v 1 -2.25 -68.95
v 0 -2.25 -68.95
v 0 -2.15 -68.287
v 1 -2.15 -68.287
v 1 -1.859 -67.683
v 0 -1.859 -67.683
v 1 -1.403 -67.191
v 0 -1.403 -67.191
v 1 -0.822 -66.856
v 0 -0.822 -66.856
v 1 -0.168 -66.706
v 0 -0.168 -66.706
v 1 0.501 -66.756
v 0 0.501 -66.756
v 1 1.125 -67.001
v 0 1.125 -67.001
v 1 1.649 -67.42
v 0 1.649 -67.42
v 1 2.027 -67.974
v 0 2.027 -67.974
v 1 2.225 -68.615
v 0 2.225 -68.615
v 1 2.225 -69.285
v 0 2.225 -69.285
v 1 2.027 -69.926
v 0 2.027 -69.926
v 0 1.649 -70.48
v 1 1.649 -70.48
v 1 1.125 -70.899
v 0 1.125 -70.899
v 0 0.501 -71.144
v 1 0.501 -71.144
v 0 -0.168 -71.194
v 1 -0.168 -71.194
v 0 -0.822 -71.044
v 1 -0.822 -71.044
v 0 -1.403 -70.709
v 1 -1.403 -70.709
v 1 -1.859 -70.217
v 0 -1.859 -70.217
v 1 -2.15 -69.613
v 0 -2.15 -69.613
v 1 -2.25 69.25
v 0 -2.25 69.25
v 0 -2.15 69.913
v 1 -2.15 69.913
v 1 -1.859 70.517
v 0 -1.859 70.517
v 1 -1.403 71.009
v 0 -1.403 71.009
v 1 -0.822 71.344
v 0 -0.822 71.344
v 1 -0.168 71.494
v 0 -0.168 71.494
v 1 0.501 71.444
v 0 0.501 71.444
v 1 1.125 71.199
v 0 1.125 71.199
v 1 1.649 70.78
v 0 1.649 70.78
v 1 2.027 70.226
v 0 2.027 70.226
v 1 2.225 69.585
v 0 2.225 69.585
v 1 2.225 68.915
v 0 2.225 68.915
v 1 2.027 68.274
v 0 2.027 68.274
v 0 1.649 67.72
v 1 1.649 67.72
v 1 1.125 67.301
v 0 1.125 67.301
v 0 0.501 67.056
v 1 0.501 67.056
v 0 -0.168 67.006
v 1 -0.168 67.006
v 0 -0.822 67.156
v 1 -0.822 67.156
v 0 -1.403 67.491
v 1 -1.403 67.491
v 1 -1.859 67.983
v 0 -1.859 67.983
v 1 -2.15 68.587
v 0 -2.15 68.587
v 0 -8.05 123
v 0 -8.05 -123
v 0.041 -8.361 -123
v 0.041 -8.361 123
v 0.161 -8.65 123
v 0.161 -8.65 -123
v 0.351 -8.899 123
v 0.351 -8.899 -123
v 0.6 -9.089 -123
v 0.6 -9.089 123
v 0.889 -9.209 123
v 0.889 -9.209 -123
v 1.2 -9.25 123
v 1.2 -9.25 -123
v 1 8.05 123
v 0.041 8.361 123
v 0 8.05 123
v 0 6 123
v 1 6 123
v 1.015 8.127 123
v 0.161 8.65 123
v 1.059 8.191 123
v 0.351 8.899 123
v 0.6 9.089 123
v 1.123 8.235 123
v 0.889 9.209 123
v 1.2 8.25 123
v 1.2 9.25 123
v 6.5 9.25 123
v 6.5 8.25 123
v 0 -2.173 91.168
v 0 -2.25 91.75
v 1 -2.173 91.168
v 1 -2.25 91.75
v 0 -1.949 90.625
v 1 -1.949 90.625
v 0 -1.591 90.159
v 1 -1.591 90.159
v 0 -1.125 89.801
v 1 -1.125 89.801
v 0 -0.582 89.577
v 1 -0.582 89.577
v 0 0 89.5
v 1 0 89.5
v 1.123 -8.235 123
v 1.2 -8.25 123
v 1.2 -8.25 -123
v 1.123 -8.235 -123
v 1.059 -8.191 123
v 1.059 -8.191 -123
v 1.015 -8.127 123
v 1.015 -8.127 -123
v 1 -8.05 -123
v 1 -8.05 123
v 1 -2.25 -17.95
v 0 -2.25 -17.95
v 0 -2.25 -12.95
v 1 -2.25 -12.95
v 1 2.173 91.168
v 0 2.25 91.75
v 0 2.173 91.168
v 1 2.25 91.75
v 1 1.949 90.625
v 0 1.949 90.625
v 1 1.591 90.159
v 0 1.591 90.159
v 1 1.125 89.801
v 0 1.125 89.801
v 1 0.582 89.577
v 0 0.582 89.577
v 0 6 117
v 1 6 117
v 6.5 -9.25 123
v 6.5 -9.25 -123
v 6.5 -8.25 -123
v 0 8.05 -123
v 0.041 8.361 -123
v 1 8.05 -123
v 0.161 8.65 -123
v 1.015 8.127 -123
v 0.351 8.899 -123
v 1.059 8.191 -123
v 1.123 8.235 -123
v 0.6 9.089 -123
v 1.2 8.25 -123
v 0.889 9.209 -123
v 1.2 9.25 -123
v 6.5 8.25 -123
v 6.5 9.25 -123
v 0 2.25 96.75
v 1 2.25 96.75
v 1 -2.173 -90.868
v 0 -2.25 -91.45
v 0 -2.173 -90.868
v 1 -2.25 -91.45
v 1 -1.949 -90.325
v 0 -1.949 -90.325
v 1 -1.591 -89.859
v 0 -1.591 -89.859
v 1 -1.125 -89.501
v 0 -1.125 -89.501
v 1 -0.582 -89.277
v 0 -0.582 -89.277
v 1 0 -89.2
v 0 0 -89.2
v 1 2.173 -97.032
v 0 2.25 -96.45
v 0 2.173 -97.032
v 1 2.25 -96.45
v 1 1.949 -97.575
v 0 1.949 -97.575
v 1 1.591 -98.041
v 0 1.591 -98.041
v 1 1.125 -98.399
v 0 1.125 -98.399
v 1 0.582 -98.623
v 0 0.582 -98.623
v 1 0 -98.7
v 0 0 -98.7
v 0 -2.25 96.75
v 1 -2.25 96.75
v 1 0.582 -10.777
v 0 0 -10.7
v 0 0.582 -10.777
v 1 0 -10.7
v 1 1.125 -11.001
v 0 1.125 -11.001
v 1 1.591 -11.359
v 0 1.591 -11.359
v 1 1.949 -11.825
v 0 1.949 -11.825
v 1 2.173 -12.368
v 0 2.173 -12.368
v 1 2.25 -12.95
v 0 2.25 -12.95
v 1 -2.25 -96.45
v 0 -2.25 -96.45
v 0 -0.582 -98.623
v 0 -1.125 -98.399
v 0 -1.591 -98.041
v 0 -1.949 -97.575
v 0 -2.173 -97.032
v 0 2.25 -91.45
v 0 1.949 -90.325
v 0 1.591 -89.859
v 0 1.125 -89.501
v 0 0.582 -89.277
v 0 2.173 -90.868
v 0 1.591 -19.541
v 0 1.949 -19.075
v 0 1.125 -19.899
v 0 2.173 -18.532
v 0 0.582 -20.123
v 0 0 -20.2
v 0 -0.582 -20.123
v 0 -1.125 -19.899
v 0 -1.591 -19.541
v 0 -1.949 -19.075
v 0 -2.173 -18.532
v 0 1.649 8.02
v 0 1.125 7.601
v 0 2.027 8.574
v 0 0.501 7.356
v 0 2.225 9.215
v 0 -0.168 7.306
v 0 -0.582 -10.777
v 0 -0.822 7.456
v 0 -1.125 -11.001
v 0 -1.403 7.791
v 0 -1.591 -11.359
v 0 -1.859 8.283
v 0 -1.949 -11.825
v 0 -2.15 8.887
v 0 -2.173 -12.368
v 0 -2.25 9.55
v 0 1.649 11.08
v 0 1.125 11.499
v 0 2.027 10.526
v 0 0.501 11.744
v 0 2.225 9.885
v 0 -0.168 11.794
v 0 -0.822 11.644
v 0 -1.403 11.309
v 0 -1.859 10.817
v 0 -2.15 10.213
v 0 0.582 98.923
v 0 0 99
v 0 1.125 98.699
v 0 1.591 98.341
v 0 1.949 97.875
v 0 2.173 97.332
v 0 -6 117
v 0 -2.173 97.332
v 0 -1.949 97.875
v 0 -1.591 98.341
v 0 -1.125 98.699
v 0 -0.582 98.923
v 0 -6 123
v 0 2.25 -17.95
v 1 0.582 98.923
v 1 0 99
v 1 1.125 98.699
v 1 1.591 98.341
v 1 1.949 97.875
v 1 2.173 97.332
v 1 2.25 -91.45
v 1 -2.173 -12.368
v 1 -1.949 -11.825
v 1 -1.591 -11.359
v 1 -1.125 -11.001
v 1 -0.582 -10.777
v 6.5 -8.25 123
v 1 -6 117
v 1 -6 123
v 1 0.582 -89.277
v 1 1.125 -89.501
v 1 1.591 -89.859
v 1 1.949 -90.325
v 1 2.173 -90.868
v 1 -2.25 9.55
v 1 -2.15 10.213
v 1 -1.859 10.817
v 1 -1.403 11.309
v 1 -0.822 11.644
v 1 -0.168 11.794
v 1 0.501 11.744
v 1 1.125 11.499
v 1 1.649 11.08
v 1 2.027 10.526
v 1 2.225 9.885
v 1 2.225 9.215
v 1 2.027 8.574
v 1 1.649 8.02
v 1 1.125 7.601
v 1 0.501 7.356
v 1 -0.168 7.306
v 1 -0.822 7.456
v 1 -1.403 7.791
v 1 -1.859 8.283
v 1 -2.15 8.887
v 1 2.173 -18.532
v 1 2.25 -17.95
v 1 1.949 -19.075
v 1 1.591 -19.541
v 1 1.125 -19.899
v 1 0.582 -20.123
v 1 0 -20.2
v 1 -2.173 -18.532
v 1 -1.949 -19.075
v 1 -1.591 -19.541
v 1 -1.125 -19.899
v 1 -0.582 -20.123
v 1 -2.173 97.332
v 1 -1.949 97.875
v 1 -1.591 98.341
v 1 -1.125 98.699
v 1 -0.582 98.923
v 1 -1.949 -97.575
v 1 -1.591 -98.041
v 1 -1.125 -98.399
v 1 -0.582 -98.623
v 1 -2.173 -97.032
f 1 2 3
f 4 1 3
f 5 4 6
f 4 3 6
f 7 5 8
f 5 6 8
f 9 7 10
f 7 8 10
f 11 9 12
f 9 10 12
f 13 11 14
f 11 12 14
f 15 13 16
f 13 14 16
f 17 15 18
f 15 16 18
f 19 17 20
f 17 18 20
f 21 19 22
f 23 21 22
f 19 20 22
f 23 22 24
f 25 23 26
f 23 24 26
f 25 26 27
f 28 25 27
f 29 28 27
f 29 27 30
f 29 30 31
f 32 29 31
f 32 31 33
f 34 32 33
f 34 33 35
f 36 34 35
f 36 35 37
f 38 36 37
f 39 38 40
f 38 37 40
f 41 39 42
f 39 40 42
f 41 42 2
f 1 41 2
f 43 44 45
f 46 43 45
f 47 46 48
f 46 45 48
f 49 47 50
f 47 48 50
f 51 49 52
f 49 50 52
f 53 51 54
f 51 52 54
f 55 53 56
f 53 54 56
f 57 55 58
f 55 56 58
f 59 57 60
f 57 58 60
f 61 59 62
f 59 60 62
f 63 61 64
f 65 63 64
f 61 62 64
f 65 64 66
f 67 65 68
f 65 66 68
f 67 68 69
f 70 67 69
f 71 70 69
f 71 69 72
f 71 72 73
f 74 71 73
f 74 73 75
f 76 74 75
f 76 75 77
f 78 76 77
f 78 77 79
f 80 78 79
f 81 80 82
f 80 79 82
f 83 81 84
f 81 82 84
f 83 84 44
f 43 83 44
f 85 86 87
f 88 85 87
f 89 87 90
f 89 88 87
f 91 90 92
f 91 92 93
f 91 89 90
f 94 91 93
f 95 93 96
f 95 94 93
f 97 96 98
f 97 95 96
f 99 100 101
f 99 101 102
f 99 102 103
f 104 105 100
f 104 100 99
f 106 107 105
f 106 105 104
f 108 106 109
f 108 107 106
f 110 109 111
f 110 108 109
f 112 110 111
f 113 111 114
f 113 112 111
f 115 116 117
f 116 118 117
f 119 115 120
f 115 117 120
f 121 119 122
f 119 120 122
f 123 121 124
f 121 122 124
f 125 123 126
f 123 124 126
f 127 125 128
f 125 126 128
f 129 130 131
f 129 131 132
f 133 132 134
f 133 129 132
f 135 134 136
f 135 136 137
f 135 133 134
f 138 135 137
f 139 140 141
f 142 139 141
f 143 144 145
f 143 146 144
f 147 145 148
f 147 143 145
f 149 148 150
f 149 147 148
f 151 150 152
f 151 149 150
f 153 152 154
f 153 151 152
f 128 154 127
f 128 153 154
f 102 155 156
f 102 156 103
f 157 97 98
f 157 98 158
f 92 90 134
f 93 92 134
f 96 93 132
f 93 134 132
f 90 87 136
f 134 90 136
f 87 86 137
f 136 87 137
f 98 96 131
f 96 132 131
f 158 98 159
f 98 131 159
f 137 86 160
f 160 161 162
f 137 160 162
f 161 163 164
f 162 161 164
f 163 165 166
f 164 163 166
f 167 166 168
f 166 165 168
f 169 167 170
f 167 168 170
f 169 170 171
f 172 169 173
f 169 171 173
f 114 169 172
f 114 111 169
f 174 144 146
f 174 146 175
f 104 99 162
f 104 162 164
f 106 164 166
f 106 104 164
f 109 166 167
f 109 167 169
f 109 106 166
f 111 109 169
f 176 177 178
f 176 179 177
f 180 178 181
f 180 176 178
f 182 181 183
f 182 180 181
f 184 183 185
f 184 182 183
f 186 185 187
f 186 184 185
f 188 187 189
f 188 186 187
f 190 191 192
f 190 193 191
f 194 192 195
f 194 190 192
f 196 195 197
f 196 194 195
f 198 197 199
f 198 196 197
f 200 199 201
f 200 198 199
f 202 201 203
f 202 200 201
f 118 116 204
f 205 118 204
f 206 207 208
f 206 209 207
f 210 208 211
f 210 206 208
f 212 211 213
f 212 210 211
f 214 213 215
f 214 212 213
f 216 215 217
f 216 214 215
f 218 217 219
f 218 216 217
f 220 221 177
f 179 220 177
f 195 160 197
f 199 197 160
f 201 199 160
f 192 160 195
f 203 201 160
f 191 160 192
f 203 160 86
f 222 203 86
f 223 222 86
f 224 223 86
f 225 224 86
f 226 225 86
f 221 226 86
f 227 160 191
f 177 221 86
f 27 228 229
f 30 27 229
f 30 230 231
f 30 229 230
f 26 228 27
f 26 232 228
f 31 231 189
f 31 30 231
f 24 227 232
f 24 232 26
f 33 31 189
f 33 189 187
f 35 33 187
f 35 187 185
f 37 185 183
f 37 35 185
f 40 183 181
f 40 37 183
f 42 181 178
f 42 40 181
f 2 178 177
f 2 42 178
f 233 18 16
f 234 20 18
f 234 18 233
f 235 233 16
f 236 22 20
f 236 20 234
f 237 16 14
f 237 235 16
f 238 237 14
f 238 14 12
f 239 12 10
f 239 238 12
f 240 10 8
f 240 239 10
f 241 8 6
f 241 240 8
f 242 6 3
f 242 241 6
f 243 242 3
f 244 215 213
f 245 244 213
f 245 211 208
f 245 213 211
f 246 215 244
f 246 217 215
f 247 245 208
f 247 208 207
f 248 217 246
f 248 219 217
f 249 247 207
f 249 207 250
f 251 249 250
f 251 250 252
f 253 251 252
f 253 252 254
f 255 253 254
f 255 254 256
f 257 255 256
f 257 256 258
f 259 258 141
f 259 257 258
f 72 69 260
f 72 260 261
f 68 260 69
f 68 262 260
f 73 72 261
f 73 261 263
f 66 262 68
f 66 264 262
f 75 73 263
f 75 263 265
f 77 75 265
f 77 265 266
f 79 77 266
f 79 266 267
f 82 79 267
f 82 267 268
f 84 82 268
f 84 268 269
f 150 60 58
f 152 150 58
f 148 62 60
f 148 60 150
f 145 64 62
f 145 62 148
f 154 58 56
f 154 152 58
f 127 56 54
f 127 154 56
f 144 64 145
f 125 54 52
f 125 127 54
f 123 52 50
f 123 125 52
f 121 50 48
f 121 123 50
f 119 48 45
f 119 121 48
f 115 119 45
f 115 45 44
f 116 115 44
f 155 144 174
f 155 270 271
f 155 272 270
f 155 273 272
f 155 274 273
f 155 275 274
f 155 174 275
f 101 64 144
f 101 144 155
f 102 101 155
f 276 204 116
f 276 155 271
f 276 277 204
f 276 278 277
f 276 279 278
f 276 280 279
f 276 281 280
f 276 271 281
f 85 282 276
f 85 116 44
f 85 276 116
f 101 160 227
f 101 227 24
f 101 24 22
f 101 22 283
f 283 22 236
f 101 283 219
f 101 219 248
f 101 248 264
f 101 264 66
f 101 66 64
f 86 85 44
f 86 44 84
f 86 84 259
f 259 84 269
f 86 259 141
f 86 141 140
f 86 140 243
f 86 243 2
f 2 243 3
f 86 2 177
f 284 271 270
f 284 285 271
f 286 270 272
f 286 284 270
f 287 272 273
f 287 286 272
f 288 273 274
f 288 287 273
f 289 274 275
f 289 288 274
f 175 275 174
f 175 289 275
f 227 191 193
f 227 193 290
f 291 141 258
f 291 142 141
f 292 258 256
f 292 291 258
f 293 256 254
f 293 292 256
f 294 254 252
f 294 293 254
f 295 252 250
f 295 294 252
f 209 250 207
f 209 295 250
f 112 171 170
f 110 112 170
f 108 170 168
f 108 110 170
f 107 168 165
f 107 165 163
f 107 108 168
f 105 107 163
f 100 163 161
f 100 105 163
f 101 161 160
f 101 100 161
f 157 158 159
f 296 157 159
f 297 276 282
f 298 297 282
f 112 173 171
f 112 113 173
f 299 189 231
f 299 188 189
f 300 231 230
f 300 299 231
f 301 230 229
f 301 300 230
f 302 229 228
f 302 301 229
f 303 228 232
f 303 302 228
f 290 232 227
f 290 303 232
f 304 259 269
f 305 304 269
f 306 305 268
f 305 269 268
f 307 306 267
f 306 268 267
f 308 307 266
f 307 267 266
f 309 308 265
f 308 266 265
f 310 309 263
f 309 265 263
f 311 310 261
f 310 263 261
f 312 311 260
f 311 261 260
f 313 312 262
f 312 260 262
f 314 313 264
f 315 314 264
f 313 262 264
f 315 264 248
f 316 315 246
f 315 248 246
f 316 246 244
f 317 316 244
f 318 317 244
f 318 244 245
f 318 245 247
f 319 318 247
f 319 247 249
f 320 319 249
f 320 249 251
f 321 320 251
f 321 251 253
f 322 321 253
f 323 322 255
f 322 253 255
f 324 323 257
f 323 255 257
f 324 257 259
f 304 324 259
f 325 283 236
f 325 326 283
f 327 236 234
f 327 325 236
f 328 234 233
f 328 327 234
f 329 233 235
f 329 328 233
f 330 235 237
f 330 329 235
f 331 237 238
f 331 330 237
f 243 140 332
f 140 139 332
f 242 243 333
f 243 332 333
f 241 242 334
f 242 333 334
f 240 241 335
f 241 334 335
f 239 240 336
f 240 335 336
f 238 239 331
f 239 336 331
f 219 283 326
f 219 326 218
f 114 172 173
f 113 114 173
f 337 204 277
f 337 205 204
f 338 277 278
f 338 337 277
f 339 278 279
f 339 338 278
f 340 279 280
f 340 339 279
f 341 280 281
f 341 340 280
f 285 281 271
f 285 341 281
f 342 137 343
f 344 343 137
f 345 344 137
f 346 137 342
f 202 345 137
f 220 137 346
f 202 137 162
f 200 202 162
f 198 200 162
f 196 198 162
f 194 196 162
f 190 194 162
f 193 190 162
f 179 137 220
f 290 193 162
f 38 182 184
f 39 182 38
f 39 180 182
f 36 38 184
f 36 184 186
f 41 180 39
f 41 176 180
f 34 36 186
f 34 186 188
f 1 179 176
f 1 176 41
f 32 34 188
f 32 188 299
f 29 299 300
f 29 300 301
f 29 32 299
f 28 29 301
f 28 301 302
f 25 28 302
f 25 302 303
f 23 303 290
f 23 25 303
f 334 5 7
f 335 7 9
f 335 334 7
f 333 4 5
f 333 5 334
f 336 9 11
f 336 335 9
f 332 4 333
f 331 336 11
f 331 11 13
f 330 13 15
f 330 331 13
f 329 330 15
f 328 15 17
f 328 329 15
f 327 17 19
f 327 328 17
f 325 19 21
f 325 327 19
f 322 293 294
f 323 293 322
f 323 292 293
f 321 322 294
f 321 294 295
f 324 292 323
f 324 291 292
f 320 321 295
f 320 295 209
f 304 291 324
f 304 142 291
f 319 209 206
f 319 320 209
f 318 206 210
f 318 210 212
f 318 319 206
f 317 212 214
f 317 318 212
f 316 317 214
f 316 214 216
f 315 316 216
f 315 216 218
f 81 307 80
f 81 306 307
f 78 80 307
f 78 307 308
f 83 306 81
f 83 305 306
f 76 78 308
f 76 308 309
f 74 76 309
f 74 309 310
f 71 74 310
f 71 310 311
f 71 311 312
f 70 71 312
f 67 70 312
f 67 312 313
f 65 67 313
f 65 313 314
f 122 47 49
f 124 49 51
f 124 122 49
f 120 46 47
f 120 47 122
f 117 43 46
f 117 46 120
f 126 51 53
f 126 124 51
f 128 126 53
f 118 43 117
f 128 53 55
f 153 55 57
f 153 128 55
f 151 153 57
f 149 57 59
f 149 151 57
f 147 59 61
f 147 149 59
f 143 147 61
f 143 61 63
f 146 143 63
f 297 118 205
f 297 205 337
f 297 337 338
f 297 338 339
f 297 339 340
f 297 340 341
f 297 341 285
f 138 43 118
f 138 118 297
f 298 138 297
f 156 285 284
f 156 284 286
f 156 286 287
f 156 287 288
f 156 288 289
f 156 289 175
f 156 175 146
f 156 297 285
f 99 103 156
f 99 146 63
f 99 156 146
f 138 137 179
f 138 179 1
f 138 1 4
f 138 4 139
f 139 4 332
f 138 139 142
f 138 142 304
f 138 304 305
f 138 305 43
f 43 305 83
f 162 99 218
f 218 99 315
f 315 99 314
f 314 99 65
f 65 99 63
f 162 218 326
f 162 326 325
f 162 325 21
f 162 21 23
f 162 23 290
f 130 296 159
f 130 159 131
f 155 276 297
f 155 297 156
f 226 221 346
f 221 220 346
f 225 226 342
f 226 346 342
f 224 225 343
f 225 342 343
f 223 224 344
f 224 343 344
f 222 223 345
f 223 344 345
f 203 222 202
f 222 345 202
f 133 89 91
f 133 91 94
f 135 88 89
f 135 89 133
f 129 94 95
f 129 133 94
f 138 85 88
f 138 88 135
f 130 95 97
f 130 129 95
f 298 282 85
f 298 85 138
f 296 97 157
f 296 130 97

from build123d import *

# Parameters (mm, degrees)
SM_BASE_FLANGE_1_DEPTH         = 123
SKETCH_2_W                     = 6
SKETCH_2_H                     = 12
CUT_EXTRUDE_1_DEPTH            = 1
SKETCH_3_W                     = 9.5
SKETCH_3_H                     = 4.5
CUT_EXTRUDE_2_DEPTH            = 1
FILLET_1_R                     = 2.25
SKETCH_4_R                     = 2.25
CUT_EXTRUDE_3_DEPTH            = 1
PATTERN_LINEAR_1_COUNT         = 2
PATTERN_LINEAR_1_PITCH         = 109.7
FILLET_1_OF_PATTERN_LINEAR_1_R = 2.25
PATTERN_LINEAR_2_COUNT         = 2
PATTERN_LINEAR_2_PITCH         = 188.2
FILLET_1_OF_PATTERN_LINEAR_2_R = 2.25
PATTERN_LINEAR_3_COUNT         = 2
PATTERN_LINEAR_3_PITCH         = 59.7
PATTERN_LINEAR_4_COUNT         = 2
PATTERN_LINEAR_4_PITCH         = 138.2


# Sheet-metal steps are written as plain solids
with BuildPart() as part:
    # Sketch 1 → Базовая кромка1 (new, symmetric)
    with BuildSketch(Plane.XY):
        with BuildLine():
            Line((6.5, 9.25), (1.2, 9.25))
            ThreePointArc((1.2, 9.25), (0.351471863, 8.898528137), (0, 8.05))
            Line((0, 8.05), (0, -8.05))
            ThreePointArc((0, -8.05), (0.351471863, -8.898528137), (1.2, -9.25))
            Line((1.2, -9.25), (6.5, -9.25))
            Line((6.5, -9.25), (6.5, -8.25))
            Line((6.5, -8.25), (1.2, -8.25))
            ThreePointArc((1.2, -8.25), (1.058578644, -8.191421356), (1, -8.05))
            Line((1, -8.05), (1, 8.05))
            ThreePointArc((1, 8.05), (1.058578644, 8.191421356), (1.2, 8.25))
            Line((1.2, 8.25), (6.5, 8.25))
            Line((6.5, 8.25), (6.5, 9.25))
        make_face()
    extrude(amount=SM_BASE_FLANGE_1_DEPTH, both=True)

    # Эскиз2 → Вытянуть1 (cut)
    with BuildSketch(Plane.ZY):
        with Locations((120, 0)):
            Rectangle(SKETCH_2_W, SKETCH_2_H)
    extrude(amount=-CUT_EXTRUDE_1_DEPTH, mode=Mode.SUBTRACT)

    # Эскиз3 → Вытянуть2 (cut)
    with BuildSketch(Plane.ZY):
        with Locations((94.25, 0)):
            Rectangle(SKETCH_3_W, SKETCH_3_H)
    cut_extrude_2 = extrude(amount=-CUT_EXTRUDE_2_DEPTH, mode=Mode.SUBTRACT)

    # Скругление1
    fillet_1_edges = [part.edges().sort_by_distance(p)[0] for p in [
        (0.5, 2.25, 99),
        (0.5, -2.25, 99),
        (0.5, 2.25, 89.5),
        (0.5, -2.25, 89.5),
    ]]
    fillet(fillet_1_edges, radius=FILLET_1_R - 0.0001)  # a hair under: the kernel refuses the full size

    # Эскиз4 → Вытянуть3 (cut)
    with BuildSketch(Plane.ZY):
        with Locations(Location((69.25, 0, 0), (0, 0, 270))):
            Circle(SKETCH_4_R)
    cut_extrude_3 = extrude(amount=-CUT_EXTRUDE_3_DEPTH, mode=Mode.SUBTRACT)

    # Линейный массив1: Вытянуть2 ×2
    with Locations(*[(0, 0, -i * PATTERN_LINEAR_1_PITCH) for i in range(1, PATTERN_LINEAR_1_COUNT)]):
        add(cut_extrude_2, mode=Mode.SUBTRACT)

    # Скругление1 of Линейный массив1
    fillet_1_of_pattern_linear_1_edges = [part.edges().sort_by_distance(p)[0] for p in [
        (0.5, 2.25, -10.7),
        (0.5, -2.25, -10.7),
        (0.5, 2.25, -20.2),
        (0.5, -2.25, -20.2),
    ]]
    fillet(fillet_1_of_pattern_linear_1_edges, radius=FILLET_1_OF_PATTERN_LINEAR_1_R - 0.0001)  # a hair under: the kernel refuses the full size

    # Линейный массив2: Вытянуть2 ×2
    with Locations(*[(0, 0, -i * PATTERN_LINEAR_2_PITCH) for i in range(1, PATTERN_LINEAR_2_COUNT)]):
        add(cut_extrude_2, mode=Mode.SUBTRACT)

    # Скругление1 of Линейный массив2
    fillet_1_of_pattern_linear_2_edges = [part.edges().sort_by_distance(p)[0] for p in [
        (0.5, 2.25, -89.2),
        (0.5, -2.25, -89.2),
        (0.5, 2.25, -98.7),
        (0.5, -2.25, -98.7),
    ]]
    fillet(fillet_1_of_pattern_linear_2_edges, radius=FILLET_1_OF_PATTERN_LINEAR_2_R - 0.0001)  # a hair under: the kernel refuses the full size

    # Линейный массив3: Вытянуть3 ×2
    with Locations(*[(0, 0, -i * PATTERN_LINEAR_3_PITCH) for i in range(1, PATTERN_LINEAR_3_COUNT)]):
        add(cut_extrude_3, mode=Mode.SUBTRACT)

    # Линейный массив4: Вытянуть3 ×2
    with Locations(*[(0, 0, -i * PATTERN_LINEAR_4_PITCH) for i in range(1, PATTERN_LINEAR_4_COUNT)]):
        add(cut_extrude_3, mode=Mode.SUBTRACT)


solid = part.part
